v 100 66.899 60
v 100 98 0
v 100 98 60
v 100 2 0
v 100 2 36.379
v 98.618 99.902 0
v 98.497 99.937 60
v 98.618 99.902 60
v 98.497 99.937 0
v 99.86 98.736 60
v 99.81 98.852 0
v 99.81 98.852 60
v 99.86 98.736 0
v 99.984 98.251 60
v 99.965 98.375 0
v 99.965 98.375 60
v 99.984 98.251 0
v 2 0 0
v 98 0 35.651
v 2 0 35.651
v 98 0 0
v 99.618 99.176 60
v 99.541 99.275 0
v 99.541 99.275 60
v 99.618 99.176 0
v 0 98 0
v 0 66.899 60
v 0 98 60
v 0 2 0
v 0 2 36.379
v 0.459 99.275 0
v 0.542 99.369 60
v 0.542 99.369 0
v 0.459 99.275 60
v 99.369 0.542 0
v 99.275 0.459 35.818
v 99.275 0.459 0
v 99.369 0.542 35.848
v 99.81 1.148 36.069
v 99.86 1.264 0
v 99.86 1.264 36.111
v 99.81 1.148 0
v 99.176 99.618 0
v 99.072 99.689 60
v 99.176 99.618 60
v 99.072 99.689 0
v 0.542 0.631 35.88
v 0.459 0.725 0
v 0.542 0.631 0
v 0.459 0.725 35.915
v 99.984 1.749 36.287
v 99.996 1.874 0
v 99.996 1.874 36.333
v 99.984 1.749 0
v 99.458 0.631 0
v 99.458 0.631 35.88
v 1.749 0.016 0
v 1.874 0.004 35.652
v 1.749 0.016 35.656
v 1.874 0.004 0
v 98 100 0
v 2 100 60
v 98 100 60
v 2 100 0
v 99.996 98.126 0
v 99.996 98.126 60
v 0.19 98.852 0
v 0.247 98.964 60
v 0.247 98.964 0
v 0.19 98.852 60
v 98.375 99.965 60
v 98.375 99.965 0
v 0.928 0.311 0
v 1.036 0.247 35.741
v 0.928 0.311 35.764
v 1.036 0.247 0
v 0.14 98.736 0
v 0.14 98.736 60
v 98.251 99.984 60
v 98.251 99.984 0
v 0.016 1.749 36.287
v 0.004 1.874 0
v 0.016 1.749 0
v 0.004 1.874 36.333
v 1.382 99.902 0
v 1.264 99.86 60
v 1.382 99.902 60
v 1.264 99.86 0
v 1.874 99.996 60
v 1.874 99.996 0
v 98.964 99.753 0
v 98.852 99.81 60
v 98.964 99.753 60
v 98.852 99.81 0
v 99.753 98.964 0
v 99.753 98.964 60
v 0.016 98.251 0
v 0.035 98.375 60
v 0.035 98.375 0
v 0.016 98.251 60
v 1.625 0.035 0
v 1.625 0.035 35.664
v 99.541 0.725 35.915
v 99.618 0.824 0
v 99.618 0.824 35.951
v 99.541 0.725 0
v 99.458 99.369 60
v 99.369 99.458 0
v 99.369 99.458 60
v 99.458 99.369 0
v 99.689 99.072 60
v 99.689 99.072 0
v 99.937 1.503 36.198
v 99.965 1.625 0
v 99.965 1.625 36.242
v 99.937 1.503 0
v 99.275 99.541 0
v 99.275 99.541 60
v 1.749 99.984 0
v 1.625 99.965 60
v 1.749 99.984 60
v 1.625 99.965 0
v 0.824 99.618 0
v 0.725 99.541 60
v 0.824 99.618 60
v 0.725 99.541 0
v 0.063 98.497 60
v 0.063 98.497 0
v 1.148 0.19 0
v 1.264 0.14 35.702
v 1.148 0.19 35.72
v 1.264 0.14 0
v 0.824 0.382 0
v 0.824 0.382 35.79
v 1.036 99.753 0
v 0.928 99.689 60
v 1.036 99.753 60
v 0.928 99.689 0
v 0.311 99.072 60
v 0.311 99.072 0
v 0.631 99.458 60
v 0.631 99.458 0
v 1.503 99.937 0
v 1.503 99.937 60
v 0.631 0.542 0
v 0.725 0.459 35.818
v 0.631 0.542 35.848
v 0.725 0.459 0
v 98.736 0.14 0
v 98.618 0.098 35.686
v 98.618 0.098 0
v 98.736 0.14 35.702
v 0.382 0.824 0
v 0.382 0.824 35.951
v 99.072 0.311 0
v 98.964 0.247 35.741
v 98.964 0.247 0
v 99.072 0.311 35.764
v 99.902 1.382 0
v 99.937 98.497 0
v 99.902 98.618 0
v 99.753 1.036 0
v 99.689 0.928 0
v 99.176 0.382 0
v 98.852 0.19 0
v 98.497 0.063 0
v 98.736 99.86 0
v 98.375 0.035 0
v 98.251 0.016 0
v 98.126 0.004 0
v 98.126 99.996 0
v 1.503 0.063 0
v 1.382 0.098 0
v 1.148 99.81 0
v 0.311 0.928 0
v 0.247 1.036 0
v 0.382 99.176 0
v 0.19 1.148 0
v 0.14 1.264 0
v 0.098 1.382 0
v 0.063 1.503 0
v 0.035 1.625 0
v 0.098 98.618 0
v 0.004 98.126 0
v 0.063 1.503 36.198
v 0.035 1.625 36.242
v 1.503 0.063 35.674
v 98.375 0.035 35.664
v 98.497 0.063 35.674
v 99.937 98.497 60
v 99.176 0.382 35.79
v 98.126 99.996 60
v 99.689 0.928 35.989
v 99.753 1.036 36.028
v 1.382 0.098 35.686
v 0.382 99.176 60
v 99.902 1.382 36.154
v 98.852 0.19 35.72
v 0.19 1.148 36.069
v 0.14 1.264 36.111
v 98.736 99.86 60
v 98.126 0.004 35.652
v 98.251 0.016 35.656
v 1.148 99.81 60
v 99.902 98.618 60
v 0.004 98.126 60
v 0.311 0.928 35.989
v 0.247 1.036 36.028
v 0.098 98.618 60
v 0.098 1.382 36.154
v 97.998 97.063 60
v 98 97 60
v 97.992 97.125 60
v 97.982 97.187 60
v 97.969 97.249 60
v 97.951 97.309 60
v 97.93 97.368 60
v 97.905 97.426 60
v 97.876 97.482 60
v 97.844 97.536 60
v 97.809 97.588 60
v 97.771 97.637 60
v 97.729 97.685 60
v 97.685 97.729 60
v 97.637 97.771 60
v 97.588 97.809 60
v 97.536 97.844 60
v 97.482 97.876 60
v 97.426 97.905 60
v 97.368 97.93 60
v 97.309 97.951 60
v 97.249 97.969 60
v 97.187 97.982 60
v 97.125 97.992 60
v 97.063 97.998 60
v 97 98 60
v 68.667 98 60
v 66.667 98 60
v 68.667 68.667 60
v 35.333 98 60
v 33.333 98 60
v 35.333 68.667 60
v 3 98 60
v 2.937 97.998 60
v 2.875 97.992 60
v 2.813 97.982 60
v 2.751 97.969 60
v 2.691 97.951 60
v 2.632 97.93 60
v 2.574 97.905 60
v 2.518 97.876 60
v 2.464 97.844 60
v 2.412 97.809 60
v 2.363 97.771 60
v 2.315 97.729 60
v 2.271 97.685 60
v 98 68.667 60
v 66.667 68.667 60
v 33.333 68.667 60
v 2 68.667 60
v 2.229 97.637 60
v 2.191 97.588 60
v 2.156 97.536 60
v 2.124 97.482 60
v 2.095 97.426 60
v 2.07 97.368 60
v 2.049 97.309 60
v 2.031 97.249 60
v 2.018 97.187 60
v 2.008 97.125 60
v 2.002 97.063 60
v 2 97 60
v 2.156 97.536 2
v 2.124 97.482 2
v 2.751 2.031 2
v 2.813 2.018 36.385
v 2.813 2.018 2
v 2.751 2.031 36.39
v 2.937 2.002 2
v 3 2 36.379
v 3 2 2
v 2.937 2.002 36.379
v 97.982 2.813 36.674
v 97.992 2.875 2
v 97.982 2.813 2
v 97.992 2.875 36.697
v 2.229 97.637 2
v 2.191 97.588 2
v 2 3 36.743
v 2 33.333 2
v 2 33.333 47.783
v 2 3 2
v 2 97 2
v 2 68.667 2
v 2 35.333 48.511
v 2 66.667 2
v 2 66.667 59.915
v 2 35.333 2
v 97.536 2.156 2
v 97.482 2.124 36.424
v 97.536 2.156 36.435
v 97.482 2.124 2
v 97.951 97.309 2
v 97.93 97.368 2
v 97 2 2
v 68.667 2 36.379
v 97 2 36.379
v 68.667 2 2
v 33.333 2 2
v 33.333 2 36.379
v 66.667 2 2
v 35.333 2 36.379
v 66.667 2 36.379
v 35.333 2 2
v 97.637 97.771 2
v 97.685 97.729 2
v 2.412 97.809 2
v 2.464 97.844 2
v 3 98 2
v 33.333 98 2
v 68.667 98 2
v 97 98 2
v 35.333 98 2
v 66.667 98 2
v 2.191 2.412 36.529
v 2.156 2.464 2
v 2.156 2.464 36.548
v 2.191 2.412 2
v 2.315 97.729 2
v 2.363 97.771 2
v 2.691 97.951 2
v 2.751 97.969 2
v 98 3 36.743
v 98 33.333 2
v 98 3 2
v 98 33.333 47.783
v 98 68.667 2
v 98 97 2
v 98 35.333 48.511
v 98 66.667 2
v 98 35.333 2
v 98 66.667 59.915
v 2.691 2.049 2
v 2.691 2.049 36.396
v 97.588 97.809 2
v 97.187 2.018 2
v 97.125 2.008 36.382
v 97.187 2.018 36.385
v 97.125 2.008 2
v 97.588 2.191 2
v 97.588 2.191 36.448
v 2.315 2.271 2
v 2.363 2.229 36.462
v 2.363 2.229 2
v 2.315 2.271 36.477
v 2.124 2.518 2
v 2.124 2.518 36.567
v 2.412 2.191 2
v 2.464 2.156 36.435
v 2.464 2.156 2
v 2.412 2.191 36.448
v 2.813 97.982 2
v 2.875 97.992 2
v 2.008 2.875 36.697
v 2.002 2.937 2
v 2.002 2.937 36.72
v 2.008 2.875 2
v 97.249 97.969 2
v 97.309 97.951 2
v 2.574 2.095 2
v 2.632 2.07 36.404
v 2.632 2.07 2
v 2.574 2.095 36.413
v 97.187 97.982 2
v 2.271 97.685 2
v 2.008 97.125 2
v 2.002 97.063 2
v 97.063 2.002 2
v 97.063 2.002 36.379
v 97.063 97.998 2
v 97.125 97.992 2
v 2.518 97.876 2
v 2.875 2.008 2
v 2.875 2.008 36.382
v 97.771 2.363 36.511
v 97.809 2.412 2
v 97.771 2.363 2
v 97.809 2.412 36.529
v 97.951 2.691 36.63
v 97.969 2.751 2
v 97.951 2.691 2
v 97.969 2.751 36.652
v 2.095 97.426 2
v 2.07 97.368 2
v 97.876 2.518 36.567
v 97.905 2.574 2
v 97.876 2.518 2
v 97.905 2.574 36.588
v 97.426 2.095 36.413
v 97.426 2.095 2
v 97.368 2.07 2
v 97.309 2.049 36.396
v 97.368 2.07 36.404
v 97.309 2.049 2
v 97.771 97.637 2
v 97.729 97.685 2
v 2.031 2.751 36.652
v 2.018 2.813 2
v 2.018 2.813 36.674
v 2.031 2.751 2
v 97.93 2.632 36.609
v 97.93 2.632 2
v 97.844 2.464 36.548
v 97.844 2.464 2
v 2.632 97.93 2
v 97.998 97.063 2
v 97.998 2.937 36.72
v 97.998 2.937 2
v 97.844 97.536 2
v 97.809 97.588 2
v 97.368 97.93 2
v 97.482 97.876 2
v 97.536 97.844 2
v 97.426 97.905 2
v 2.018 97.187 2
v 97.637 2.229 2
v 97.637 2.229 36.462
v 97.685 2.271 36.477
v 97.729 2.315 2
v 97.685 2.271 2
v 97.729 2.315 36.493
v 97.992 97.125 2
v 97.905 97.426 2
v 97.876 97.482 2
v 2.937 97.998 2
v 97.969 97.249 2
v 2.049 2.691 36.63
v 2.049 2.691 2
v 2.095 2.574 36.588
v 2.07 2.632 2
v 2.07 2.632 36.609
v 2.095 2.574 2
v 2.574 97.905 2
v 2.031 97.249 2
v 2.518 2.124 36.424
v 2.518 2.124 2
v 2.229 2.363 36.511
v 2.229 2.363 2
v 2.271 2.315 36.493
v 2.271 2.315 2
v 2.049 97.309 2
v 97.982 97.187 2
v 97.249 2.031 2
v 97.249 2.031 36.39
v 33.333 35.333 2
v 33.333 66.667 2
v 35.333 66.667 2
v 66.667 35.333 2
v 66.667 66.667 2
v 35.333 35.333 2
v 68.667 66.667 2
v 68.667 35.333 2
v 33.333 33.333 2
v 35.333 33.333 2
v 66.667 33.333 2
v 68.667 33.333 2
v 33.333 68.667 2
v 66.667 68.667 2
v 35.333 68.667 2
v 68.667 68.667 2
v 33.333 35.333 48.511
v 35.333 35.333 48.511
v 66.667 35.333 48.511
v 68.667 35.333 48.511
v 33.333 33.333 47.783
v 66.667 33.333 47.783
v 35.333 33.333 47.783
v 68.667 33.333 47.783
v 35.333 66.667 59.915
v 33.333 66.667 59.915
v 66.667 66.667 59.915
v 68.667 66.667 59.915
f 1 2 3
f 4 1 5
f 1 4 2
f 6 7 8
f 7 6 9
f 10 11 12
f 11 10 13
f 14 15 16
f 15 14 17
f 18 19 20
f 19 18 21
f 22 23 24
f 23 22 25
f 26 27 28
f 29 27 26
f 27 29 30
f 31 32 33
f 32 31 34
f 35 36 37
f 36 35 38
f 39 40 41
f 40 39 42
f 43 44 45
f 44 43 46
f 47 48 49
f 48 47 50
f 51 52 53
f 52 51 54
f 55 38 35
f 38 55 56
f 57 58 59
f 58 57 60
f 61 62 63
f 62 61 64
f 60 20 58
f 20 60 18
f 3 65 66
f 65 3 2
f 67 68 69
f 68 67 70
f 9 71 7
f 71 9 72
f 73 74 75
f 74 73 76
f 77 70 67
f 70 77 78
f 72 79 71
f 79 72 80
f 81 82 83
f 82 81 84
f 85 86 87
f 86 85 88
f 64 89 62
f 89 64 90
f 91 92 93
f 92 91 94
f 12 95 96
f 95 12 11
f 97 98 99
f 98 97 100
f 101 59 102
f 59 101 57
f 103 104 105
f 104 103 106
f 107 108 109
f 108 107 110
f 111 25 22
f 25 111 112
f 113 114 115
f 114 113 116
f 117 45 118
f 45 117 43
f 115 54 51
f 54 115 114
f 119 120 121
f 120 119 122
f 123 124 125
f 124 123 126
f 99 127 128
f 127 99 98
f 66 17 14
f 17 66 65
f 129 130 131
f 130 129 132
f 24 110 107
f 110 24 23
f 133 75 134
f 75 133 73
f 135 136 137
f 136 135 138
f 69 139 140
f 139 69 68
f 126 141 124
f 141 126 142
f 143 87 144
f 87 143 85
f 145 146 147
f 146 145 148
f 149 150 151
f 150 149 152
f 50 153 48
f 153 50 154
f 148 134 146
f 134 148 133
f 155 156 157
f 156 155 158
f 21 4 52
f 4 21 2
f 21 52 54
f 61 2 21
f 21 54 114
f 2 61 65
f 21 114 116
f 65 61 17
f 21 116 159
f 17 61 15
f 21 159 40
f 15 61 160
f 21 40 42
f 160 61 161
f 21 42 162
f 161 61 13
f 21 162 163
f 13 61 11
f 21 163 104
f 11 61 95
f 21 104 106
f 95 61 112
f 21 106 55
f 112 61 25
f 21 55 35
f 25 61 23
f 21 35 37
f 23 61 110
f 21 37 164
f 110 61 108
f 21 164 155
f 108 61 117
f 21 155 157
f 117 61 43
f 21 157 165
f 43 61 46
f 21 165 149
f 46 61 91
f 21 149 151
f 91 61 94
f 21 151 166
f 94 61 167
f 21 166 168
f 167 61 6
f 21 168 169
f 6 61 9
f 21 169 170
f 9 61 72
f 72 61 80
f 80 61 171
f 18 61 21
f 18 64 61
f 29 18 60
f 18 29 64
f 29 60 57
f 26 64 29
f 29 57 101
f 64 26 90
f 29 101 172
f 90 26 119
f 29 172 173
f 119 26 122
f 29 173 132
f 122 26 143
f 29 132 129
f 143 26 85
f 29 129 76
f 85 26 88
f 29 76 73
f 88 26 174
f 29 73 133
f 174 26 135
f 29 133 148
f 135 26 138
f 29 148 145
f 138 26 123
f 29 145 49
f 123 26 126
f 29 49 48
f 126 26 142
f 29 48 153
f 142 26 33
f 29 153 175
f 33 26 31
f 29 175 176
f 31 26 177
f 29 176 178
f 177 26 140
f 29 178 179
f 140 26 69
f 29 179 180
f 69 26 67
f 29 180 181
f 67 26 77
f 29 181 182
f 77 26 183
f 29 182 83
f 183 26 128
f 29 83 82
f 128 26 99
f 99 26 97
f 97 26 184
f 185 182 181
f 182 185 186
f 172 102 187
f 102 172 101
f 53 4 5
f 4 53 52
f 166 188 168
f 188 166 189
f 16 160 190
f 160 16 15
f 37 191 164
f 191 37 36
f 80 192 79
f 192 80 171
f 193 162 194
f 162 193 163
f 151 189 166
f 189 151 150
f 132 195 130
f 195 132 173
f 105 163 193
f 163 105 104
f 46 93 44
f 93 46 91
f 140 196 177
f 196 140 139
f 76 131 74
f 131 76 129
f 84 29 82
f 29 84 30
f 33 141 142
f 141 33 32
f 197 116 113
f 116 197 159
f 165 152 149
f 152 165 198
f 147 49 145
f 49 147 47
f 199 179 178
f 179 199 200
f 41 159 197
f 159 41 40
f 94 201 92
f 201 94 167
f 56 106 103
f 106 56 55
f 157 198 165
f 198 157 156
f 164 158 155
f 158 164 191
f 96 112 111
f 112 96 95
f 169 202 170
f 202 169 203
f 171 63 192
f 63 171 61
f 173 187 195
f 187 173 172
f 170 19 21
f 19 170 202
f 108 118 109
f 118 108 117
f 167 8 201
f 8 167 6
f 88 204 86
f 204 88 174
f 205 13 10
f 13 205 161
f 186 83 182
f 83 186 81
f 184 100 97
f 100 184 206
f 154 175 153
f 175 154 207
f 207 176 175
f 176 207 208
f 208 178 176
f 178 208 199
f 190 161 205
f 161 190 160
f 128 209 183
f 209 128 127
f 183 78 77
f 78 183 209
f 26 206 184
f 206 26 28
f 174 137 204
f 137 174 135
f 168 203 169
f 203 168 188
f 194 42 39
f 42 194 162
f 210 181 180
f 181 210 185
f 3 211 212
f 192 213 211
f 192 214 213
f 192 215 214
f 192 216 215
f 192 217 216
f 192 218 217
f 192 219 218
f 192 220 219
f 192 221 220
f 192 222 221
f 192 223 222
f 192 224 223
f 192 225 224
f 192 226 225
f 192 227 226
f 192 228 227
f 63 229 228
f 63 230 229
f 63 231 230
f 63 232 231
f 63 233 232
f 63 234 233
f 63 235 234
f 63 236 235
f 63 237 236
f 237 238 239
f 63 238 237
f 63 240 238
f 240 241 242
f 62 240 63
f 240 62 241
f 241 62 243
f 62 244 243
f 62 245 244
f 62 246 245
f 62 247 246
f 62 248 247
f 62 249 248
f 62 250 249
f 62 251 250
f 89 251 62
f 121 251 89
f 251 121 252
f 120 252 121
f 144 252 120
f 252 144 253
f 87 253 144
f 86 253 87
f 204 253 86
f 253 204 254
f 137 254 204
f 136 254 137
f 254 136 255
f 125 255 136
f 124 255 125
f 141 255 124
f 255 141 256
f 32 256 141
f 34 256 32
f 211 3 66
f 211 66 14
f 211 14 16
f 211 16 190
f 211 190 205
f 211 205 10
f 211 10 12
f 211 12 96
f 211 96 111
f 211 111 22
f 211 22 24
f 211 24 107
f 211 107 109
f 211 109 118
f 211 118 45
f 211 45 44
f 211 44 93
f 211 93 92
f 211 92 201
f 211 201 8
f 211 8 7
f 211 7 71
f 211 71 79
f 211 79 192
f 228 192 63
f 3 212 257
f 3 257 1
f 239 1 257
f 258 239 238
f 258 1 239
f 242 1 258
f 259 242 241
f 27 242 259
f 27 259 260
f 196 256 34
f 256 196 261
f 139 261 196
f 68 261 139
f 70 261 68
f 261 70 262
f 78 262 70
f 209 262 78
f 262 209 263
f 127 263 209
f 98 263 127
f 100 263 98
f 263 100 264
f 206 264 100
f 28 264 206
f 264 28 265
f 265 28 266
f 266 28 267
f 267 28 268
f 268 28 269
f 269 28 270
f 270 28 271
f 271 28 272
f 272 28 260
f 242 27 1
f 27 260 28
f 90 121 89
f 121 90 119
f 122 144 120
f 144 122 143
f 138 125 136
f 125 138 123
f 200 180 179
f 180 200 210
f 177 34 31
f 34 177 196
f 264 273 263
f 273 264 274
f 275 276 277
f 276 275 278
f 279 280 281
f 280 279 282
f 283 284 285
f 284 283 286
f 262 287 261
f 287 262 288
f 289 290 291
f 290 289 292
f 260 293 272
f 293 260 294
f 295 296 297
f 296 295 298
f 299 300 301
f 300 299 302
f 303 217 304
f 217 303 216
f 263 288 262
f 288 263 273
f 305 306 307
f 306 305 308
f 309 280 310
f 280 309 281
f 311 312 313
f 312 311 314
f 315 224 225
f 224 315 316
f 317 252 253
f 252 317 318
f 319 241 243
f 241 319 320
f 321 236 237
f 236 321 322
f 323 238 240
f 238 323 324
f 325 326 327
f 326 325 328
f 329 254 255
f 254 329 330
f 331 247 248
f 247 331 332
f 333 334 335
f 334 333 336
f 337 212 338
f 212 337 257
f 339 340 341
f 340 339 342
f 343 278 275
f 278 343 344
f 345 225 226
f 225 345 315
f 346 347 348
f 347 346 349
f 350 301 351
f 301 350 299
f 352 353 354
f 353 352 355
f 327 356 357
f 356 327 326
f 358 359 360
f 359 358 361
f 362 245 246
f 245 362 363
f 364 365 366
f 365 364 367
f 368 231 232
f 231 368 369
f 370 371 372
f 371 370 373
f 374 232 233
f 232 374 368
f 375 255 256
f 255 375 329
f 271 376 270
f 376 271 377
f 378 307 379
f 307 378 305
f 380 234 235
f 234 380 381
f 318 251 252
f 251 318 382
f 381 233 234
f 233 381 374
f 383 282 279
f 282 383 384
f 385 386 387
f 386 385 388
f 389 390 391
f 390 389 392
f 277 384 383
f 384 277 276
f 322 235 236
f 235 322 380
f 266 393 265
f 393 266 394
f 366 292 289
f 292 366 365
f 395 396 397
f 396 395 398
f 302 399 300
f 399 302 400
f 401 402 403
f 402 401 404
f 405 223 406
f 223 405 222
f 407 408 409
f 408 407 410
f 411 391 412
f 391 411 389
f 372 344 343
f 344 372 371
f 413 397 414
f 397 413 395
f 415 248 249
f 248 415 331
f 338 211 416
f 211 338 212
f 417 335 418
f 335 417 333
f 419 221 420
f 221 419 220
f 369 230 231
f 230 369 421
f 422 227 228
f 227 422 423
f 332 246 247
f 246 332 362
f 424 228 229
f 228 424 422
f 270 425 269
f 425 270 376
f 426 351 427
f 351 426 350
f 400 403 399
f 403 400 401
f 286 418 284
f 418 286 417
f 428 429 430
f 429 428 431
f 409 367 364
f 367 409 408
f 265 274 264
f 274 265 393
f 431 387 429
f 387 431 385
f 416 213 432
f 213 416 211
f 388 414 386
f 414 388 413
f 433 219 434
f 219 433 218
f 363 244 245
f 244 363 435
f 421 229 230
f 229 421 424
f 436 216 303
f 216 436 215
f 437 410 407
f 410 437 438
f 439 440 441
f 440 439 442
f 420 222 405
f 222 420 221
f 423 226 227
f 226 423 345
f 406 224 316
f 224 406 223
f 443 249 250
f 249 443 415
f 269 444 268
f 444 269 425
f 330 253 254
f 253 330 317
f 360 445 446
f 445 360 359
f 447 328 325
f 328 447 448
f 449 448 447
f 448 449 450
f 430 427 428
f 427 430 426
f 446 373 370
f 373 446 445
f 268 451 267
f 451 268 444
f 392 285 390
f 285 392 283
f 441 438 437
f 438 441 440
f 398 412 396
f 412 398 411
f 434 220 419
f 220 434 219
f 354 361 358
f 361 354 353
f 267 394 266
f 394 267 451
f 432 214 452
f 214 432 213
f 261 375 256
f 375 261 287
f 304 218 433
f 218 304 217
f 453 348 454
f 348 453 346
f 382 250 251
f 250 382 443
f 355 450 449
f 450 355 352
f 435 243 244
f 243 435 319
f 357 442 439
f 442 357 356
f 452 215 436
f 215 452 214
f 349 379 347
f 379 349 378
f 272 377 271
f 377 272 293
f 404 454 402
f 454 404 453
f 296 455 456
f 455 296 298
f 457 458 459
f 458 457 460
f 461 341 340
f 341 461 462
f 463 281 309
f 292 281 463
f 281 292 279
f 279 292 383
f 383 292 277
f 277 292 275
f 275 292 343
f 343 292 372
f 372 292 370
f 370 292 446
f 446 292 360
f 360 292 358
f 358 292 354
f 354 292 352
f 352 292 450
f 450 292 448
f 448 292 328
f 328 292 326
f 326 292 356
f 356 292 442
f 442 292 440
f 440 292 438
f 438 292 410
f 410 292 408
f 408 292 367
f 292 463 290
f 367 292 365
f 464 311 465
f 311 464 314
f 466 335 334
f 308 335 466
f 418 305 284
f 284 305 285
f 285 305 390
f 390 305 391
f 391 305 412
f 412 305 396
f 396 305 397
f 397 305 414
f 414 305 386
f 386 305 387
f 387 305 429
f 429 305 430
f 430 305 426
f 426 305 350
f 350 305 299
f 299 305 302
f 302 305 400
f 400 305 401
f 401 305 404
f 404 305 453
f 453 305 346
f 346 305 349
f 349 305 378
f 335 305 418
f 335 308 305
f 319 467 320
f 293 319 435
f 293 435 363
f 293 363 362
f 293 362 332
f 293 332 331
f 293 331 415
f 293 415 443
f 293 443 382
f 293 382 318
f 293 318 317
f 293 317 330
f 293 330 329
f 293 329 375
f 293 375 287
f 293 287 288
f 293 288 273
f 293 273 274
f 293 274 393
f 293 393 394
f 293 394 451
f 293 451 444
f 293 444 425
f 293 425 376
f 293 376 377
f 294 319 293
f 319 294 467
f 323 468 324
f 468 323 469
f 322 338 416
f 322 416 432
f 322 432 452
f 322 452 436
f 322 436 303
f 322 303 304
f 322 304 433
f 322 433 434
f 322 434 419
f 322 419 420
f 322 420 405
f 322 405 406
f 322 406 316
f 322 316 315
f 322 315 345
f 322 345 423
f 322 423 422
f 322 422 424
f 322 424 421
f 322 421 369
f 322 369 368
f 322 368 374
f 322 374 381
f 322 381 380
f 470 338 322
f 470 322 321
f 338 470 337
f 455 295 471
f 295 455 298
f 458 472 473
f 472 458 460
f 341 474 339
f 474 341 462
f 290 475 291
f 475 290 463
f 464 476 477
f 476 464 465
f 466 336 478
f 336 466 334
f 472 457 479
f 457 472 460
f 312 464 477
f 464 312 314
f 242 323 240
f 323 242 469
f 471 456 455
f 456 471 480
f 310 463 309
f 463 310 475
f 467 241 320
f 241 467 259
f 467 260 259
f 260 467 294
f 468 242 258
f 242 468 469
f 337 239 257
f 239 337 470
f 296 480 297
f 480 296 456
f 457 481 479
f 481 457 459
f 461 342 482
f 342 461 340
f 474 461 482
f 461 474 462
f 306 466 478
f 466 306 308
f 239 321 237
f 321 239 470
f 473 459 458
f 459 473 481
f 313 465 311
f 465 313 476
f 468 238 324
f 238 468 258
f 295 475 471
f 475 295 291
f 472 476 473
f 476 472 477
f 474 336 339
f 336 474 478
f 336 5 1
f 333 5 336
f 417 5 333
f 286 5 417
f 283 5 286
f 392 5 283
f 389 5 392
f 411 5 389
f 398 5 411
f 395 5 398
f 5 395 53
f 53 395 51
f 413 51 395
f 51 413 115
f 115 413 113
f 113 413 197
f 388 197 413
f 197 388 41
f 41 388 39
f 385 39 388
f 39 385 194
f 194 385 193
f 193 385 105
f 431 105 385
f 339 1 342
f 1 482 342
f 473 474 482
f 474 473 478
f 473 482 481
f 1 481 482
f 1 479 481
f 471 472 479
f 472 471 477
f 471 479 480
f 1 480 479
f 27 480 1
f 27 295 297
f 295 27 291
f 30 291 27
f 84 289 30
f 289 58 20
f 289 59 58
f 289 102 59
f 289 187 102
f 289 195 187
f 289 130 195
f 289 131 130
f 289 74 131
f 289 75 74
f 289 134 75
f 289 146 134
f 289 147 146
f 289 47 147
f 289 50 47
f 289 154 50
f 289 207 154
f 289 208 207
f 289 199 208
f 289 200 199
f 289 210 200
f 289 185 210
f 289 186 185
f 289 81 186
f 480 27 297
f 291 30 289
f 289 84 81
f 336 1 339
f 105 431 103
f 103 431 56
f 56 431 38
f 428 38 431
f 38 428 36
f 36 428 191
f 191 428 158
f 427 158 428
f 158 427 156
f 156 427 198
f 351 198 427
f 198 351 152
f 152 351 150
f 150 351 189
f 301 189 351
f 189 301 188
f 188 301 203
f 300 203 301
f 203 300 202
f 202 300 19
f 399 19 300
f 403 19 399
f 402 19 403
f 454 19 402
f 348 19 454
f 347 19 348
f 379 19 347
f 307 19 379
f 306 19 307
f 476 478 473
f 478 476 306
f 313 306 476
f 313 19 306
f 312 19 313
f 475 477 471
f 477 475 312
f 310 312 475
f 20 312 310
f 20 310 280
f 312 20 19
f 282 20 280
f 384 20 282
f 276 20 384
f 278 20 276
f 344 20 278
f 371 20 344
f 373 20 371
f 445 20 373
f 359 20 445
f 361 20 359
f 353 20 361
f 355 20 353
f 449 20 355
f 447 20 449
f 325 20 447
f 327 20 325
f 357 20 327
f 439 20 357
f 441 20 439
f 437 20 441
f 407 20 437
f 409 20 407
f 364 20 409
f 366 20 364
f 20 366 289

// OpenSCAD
$fn = 100;
xlength = 100;
ywidth = 100;
zheight = 60;
corner = 2; // radius
wall = 2; // thickness
divisions = 3;
fudge = 43;
angle = 20;

difference()
{
    base();
    
    // trianglular cutout 
    translate([-xlength/2,-fudge,zheight/3]) rotate([angle,0,0]) cube([xlength*2, ywidth*2, zheight*2]);
}

module base()
{
    // hollow box with rounded corners
    difference()
    {
        roundedBox(xlength, ywidth, zheight, corner);
        translate([wall,wall,wall]) roundedBox(xlength-2*wall, ywidth-2*wall, zheight, corner/2);
    }

    // dividers
    for(i = [1 : 1 : divisions-1])
    {
        translate([0,ywidth/divisions*i,wall]) cube([xlength,wall,zheight-wall]);
        translate([xlength/divisions*i,0,wall]) cube([wall,ywidth,zheight-wall]);
    }
}

module roundedBox(xdim, ydim, zdim, rdim)
{
    hull()
    {
        translate([rdim,rdim,0]) cylinder(h=zdim,r=rdim);
        translate([xdim-rdim,rdim,0]) cylinder(h=zdim,r=rdim);
        translate([rdim,ydim-rdim,0]) cylinder(h=zdim,r=rdim);
        translate([xdim-rdim,ydim-rdim,0]) cylinder(h=zdim,r=rdim);
    }
}
